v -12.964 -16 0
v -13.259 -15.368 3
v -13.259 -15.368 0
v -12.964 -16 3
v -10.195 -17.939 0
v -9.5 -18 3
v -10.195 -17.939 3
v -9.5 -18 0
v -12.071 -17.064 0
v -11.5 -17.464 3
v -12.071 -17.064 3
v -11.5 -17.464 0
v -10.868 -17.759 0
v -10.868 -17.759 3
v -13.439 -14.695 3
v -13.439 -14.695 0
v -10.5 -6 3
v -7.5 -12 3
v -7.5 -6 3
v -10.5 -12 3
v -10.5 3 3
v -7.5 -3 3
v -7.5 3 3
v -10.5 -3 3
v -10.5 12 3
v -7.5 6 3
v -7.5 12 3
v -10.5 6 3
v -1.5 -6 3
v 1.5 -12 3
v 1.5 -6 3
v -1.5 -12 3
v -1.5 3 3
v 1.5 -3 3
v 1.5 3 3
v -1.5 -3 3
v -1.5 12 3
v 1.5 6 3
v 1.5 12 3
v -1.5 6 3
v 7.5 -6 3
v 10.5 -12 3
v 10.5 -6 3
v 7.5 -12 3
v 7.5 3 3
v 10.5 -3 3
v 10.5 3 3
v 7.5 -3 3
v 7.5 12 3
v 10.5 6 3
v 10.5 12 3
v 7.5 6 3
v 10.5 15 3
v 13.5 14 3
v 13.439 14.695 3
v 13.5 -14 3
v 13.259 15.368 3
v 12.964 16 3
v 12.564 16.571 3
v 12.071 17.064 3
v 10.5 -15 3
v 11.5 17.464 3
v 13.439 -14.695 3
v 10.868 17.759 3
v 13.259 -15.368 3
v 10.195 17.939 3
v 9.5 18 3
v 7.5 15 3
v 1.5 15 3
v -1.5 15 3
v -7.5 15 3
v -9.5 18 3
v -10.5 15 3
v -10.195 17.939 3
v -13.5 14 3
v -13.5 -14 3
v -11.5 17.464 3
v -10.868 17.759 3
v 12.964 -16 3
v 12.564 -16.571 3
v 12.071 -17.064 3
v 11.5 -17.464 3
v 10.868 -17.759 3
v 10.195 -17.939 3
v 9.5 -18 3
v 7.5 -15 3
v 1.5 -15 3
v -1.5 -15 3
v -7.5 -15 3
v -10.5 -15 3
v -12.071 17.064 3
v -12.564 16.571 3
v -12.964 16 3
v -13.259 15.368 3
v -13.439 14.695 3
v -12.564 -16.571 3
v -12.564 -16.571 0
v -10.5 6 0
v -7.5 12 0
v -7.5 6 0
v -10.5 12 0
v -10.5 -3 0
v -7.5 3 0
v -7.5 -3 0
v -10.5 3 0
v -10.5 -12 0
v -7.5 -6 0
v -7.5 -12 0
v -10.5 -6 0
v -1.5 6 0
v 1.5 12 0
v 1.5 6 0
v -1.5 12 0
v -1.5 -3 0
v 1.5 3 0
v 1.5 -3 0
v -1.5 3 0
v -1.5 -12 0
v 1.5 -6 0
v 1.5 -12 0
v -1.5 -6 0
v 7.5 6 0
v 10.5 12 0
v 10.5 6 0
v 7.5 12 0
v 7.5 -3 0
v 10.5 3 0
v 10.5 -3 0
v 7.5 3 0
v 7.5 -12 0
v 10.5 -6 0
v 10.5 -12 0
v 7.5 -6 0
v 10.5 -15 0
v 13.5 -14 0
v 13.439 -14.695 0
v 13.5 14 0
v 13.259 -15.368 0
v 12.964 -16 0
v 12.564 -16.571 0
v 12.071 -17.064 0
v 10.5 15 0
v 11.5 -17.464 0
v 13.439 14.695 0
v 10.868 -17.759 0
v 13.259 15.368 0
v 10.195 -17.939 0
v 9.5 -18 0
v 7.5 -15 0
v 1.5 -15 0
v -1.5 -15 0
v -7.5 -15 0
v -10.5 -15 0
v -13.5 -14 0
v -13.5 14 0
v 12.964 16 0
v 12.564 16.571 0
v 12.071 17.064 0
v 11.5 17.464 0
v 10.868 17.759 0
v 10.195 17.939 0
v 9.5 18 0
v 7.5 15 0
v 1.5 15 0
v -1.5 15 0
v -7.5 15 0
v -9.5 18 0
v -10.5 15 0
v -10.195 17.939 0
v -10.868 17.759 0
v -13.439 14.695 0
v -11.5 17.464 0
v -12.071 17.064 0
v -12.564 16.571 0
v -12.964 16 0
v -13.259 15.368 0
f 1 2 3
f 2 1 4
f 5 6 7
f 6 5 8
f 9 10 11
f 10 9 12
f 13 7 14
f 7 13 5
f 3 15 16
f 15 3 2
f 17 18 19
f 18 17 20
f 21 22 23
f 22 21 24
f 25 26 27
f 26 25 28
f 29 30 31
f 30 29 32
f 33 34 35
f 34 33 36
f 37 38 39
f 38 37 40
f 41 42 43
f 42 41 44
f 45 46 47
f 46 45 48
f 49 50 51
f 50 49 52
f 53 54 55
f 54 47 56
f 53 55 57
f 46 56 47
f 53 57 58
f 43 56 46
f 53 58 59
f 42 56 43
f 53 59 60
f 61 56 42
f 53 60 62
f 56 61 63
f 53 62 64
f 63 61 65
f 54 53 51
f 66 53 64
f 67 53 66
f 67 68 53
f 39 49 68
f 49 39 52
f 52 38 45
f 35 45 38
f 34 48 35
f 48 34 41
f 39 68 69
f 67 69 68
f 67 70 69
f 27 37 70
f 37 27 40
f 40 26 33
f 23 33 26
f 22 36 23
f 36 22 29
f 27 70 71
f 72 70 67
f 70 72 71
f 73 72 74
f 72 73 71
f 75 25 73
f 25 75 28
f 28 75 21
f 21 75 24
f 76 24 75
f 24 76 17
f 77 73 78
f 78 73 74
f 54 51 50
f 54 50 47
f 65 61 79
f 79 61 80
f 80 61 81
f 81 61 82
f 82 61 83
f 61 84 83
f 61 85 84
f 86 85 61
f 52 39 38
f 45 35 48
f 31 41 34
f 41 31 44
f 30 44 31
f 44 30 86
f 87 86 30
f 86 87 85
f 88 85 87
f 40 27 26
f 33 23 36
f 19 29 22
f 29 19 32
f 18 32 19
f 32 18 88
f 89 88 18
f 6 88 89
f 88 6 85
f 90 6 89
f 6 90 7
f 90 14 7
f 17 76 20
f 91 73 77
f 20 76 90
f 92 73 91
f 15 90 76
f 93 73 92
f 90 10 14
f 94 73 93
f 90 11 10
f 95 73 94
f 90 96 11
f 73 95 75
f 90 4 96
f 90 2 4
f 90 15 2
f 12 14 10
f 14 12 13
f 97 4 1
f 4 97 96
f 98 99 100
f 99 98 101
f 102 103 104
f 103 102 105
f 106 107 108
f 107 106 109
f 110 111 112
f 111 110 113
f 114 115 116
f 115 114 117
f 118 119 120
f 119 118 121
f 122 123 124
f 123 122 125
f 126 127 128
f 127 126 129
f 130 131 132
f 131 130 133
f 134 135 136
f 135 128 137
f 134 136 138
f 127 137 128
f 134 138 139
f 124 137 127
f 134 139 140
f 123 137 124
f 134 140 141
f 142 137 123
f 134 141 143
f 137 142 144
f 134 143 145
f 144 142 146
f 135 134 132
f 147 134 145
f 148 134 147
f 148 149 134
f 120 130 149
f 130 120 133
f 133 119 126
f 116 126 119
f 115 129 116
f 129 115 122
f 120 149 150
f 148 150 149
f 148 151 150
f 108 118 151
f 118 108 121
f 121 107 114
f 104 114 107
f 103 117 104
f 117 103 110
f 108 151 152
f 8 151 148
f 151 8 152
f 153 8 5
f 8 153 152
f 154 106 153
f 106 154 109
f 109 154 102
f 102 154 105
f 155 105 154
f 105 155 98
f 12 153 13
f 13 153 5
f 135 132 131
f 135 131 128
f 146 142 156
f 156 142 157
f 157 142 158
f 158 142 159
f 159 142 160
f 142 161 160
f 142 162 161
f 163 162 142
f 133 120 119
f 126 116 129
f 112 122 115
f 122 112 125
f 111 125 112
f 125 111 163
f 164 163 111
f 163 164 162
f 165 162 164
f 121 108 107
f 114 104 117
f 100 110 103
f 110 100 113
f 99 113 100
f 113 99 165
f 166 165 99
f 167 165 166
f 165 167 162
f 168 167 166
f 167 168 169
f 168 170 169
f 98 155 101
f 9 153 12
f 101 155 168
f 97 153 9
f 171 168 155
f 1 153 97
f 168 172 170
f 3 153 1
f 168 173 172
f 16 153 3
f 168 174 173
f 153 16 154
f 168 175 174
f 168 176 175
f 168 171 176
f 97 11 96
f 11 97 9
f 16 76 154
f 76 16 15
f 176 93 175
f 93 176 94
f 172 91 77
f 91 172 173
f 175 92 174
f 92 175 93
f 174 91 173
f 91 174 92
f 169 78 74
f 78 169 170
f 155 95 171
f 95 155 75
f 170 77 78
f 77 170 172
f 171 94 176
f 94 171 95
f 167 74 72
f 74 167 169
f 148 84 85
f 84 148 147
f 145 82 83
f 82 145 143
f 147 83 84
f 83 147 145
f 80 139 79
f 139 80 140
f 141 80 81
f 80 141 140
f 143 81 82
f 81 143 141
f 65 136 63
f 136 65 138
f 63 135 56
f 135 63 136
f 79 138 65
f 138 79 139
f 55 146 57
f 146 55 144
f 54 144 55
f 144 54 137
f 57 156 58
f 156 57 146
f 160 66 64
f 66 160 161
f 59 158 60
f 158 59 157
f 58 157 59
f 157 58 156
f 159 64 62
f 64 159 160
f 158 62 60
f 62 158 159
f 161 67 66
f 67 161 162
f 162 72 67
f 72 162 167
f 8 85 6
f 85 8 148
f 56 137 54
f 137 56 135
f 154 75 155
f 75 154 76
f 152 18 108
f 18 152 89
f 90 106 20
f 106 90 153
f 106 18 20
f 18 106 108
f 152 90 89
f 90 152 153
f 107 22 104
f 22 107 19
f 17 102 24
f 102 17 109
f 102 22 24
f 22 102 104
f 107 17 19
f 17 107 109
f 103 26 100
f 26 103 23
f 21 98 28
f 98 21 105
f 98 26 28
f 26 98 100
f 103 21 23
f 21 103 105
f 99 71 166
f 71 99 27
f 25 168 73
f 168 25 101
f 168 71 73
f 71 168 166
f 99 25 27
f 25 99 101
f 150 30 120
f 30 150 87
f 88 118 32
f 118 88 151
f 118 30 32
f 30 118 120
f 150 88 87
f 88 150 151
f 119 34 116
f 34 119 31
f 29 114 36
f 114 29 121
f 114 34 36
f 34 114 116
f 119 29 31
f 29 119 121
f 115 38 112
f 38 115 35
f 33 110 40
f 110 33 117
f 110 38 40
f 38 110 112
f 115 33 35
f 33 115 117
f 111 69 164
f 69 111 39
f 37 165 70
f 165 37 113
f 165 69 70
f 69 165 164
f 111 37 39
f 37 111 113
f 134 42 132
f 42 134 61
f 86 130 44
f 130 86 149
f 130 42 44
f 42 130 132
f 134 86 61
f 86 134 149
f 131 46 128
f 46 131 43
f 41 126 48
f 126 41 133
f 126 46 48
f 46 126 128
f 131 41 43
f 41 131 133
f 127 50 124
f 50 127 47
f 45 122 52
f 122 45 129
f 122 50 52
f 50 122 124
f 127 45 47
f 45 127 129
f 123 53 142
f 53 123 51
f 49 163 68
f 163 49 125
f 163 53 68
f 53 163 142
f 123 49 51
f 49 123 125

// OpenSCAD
//!OpenSCAD

//all units are mm

//Cell Size
cellsize = 3;

//Cell Spacing (must be larger than cellsize or things get wierd)
cellspacing = 9;

//Edge padding
padding = 3;

//Cells Wide
cellsw = 3;

//Cells High
cellsh = 4;

//Shape
isCircle = 0; //[0:Square, 1:Circle]

//Thickness
thickness = 3;

//Edge Radius
radius = 4;

width = (cellsize * cellsw)  + ((cellspacing-cellsize) * (cellsw-1)) + (padding*2);
height = (cellsize * cellsh)  + ((cellspacing-cellsize) * (cellsh-1)) + (padding*2);

//--------

module cell(size, thickness, isCircle) {
    if(isCircle) {
        translate([size/2, size/2, 0])
        cylinder(r = size/2, h = thickness + 0.2, $fn = 72, center=false);
    } else {
        cube(size=[size, size, thickness + 0.2], center=false);
    }
}

module roundedBox(size, radius)
{
    //cube(size, false);
    union() {
        translate([radius,0,0]) {
            cube(size - [2*radius,0,0], false);
        }
        translate([0,radius,0]) {
            cube(size - [0,2*radius,0], false);
        }
        
        for (x = [radius, size[0] -  radius],
             y = [radius, size[1] - radius]) {
          translate([x,y,0]) cylinder(r=radius, h=size[2], center=false, $fn=36);
        }
    }
}

module grid(w, h, sz, spacing, thickness, isCircle) {
	union(){
		for(i = [0 : w-1]){
			for(j = [0 : h-1]){
				translate([i * spacing, j * spacing, -0.1])
				cell(size=sz, thickness=thickness, isCircle=isCircle);
			}
		}
	}
}

translate([-width/2, -height/2, 0])
difference(){
	roundedBox(size=[width, height, thickness], radius=radius);
	translate([padding, padding, 0]) 
	    grid(w=cellsw, h=cellsh, sz=cellsize, spacing=cellspacing, thickness=thickness, isCircle=isCircle);
	
};
